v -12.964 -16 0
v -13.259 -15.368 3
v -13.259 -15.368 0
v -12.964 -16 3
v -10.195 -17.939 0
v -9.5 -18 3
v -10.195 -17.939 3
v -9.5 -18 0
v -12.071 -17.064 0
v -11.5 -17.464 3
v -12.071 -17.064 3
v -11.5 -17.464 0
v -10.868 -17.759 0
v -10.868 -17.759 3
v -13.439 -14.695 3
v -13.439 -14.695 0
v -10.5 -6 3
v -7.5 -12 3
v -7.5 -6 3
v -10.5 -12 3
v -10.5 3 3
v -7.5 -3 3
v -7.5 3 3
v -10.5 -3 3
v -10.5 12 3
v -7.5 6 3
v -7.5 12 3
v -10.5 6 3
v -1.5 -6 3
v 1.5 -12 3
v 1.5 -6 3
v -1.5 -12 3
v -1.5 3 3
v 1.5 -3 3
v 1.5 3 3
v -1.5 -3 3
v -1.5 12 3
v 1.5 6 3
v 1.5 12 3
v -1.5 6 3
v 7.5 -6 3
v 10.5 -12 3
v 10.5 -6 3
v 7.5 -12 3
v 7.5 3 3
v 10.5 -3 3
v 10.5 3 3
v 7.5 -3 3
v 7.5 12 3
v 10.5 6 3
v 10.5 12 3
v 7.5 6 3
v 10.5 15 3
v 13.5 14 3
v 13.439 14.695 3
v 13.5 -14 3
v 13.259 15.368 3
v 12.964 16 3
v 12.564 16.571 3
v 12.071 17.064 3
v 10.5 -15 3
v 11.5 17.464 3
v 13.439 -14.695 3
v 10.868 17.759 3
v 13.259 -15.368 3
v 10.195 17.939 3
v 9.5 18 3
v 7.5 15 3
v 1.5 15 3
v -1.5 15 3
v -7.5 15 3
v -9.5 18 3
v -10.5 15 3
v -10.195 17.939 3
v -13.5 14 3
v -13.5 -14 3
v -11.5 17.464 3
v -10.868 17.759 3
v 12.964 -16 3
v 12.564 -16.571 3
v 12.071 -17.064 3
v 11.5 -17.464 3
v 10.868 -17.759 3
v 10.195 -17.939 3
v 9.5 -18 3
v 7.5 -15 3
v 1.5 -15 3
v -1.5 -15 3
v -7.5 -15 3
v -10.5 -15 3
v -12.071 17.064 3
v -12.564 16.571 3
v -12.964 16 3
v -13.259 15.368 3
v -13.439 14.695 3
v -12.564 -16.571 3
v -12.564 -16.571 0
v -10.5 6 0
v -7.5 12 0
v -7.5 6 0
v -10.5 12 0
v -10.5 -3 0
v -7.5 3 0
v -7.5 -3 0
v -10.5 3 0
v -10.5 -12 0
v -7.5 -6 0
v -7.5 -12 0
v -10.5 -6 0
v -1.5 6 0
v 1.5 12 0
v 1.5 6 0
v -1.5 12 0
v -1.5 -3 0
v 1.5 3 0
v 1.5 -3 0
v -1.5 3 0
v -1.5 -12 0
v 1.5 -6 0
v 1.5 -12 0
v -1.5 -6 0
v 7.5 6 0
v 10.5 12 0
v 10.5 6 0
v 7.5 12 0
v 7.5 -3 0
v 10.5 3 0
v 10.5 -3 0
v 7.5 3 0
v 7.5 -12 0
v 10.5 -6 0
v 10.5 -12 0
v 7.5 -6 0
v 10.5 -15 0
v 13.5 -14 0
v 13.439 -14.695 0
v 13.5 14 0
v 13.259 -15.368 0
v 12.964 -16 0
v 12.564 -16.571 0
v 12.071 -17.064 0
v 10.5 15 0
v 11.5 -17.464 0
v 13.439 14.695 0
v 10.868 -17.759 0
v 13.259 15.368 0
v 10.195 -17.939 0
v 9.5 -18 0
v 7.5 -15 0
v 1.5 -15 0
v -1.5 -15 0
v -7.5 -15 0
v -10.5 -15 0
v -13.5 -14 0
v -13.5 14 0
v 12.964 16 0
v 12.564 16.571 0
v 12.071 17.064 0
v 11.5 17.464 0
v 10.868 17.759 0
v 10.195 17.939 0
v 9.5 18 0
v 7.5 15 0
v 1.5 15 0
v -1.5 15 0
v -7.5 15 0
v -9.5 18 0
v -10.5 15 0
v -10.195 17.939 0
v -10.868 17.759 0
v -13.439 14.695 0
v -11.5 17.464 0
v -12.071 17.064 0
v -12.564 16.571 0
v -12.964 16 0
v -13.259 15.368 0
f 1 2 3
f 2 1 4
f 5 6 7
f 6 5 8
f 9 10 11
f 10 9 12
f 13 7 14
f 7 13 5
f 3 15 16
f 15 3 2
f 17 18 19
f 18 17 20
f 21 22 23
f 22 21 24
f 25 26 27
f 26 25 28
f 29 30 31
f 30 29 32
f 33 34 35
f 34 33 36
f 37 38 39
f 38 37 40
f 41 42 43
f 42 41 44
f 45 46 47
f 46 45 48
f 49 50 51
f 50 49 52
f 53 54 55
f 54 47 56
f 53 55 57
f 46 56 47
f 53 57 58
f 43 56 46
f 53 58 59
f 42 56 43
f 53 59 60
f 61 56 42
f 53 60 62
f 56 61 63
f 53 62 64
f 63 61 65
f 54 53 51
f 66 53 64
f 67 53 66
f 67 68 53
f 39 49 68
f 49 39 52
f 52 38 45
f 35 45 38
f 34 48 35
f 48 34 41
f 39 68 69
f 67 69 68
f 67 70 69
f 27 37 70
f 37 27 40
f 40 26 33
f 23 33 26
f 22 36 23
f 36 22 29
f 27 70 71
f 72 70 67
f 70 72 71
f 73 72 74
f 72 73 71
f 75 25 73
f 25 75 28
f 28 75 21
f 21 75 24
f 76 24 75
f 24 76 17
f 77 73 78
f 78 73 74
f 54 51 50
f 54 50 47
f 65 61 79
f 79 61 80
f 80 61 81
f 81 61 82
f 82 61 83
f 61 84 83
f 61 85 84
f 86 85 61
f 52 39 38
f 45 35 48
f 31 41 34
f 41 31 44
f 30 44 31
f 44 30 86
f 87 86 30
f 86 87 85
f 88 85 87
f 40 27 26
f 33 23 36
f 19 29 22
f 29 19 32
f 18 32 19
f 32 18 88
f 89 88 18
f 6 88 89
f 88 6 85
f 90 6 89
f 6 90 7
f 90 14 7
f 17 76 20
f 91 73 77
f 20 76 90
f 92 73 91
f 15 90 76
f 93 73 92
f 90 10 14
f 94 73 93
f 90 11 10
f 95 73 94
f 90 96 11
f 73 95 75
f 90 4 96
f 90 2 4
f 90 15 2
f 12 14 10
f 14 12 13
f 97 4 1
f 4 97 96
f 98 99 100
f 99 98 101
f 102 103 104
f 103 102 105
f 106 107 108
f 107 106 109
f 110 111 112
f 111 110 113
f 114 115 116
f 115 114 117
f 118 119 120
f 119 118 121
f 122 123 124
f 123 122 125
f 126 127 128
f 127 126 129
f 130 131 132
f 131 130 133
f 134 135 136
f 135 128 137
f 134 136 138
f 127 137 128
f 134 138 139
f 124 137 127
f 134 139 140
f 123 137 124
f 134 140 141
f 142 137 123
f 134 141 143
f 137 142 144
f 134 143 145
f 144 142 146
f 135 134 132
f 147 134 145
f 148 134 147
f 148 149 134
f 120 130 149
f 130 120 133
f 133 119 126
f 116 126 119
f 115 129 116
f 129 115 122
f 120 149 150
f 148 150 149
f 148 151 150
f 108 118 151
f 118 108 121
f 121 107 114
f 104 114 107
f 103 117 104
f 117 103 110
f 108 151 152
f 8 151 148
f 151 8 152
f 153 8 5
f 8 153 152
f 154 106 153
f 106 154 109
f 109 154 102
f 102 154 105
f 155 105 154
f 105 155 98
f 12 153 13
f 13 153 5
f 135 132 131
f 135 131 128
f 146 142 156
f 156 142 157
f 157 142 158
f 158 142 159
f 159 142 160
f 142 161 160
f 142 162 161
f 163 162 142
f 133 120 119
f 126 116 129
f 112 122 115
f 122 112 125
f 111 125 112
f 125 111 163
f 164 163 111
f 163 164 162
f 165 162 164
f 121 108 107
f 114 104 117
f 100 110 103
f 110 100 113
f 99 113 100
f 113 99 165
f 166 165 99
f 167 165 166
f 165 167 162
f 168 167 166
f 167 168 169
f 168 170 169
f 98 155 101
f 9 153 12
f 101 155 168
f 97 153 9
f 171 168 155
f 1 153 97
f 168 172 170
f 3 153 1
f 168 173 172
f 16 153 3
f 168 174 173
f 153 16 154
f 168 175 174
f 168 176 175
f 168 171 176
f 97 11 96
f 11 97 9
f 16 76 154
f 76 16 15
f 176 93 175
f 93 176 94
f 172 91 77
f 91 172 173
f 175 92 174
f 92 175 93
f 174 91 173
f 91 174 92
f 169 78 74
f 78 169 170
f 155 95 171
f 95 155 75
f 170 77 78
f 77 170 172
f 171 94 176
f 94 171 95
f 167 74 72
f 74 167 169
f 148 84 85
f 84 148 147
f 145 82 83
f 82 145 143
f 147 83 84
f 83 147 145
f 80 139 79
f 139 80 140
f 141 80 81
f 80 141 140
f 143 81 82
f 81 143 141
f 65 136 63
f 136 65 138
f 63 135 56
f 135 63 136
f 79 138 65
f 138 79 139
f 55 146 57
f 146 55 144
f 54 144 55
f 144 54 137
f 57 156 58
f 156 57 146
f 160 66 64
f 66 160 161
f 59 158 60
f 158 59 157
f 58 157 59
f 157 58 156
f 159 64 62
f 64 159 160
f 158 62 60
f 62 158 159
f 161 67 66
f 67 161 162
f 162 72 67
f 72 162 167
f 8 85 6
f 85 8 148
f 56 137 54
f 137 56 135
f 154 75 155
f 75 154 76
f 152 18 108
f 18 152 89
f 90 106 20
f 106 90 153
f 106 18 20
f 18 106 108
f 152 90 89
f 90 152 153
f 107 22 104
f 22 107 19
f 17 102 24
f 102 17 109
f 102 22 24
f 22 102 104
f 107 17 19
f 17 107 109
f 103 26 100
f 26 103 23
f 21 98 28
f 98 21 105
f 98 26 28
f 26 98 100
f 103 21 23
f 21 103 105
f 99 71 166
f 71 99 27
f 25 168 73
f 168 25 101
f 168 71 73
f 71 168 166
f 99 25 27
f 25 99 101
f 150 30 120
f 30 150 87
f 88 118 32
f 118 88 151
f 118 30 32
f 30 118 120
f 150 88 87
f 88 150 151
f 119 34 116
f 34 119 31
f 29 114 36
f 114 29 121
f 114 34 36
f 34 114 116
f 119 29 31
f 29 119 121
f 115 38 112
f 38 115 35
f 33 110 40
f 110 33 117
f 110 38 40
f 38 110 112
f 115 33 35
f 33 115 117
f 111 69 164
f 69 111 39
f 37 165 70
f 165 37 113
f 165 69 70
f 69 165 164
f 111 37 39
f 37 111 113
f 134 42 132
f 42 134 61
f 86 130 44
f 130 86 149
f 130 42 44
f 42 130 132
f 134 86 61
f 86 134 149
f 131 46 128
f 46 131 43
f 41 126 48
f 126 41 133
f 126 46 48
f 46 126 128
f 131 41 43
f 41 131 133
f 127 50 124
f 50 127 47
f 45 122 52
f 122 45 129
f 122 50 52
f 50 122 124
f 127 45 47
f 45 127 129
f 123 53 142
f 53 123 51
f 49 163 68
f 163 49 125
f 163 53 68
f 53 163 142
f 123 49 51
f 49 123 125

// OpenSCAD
//!OpenSCAD

//all units are mm

//Cell Size
cellsize = 3;

//Cell Spacing (must be larger than cellsize or things get wierd)
cellspacing = 9;

//Edge padding
padding = 3;

//Cells Wide
cellsw = 3;

//Cells High
cellsh = 4;

//Shape
isCircle = 0; //[0:Square, 1:Circle]

//Thickness
thickness = 3;

//Edge Radius
radius = 4;

width = (cellsize * cellsw)  + ((cellspacing-cellsize) * (cellsw-1)) + (padding*2);
height = (cellsize * cellsh)  + ((cellspacing-cellsize) * (cellsh-1)) + (padding*2);

//--------

module cell(size, thickness, isCircle) {
    if(isCircle) {
        translate([size/2, size/2, 0])
        cylinder(r = size/2, h = thickness + 0.2, $fn = 72, center=false);
    } else {
        cube(size=[size, size, thickness + 0.2], center=false);
    }
}

module roundedBox(size, radius)
{
    //cube(size, false);
    union() {
        translate([radius,0,0]) {
            cube(size - [2*radius,0,0], false);
        }
        translate([0,radius,0]) {
            cube(size - [0,2*radius,0], false);
        }
        
        for (x = [radius, size[0] -  radius],
             y = [radius, size[1] - radius]) {
          translate([x,y,0]) cylinder(r=radius, h=size[2], center=false, $fn=36);
        }
    }
}

module grid(w, h, sz, spacing, thickness, isCircle) {
	union(){
		for(i = [0 : w-1]){
			for(j = [0 : h-1]){
				translate([i * spacing, j * spacing, -0.1])
				cell(size=sz, thickness=thickness, isCircle=isCircle);
			}
		}
	}
}

translate([-width/2, -height/2, 0])
difference(){
	roundedBox(size=[width, height, thickness], radius=radius);
	translate([padding, padding, 0]) 
	    grid(w=cellsw, h=cellsh, sz=cellsize, spacing=cellspacing, thickness=thickness, isCircle=isCircle);
	
};
